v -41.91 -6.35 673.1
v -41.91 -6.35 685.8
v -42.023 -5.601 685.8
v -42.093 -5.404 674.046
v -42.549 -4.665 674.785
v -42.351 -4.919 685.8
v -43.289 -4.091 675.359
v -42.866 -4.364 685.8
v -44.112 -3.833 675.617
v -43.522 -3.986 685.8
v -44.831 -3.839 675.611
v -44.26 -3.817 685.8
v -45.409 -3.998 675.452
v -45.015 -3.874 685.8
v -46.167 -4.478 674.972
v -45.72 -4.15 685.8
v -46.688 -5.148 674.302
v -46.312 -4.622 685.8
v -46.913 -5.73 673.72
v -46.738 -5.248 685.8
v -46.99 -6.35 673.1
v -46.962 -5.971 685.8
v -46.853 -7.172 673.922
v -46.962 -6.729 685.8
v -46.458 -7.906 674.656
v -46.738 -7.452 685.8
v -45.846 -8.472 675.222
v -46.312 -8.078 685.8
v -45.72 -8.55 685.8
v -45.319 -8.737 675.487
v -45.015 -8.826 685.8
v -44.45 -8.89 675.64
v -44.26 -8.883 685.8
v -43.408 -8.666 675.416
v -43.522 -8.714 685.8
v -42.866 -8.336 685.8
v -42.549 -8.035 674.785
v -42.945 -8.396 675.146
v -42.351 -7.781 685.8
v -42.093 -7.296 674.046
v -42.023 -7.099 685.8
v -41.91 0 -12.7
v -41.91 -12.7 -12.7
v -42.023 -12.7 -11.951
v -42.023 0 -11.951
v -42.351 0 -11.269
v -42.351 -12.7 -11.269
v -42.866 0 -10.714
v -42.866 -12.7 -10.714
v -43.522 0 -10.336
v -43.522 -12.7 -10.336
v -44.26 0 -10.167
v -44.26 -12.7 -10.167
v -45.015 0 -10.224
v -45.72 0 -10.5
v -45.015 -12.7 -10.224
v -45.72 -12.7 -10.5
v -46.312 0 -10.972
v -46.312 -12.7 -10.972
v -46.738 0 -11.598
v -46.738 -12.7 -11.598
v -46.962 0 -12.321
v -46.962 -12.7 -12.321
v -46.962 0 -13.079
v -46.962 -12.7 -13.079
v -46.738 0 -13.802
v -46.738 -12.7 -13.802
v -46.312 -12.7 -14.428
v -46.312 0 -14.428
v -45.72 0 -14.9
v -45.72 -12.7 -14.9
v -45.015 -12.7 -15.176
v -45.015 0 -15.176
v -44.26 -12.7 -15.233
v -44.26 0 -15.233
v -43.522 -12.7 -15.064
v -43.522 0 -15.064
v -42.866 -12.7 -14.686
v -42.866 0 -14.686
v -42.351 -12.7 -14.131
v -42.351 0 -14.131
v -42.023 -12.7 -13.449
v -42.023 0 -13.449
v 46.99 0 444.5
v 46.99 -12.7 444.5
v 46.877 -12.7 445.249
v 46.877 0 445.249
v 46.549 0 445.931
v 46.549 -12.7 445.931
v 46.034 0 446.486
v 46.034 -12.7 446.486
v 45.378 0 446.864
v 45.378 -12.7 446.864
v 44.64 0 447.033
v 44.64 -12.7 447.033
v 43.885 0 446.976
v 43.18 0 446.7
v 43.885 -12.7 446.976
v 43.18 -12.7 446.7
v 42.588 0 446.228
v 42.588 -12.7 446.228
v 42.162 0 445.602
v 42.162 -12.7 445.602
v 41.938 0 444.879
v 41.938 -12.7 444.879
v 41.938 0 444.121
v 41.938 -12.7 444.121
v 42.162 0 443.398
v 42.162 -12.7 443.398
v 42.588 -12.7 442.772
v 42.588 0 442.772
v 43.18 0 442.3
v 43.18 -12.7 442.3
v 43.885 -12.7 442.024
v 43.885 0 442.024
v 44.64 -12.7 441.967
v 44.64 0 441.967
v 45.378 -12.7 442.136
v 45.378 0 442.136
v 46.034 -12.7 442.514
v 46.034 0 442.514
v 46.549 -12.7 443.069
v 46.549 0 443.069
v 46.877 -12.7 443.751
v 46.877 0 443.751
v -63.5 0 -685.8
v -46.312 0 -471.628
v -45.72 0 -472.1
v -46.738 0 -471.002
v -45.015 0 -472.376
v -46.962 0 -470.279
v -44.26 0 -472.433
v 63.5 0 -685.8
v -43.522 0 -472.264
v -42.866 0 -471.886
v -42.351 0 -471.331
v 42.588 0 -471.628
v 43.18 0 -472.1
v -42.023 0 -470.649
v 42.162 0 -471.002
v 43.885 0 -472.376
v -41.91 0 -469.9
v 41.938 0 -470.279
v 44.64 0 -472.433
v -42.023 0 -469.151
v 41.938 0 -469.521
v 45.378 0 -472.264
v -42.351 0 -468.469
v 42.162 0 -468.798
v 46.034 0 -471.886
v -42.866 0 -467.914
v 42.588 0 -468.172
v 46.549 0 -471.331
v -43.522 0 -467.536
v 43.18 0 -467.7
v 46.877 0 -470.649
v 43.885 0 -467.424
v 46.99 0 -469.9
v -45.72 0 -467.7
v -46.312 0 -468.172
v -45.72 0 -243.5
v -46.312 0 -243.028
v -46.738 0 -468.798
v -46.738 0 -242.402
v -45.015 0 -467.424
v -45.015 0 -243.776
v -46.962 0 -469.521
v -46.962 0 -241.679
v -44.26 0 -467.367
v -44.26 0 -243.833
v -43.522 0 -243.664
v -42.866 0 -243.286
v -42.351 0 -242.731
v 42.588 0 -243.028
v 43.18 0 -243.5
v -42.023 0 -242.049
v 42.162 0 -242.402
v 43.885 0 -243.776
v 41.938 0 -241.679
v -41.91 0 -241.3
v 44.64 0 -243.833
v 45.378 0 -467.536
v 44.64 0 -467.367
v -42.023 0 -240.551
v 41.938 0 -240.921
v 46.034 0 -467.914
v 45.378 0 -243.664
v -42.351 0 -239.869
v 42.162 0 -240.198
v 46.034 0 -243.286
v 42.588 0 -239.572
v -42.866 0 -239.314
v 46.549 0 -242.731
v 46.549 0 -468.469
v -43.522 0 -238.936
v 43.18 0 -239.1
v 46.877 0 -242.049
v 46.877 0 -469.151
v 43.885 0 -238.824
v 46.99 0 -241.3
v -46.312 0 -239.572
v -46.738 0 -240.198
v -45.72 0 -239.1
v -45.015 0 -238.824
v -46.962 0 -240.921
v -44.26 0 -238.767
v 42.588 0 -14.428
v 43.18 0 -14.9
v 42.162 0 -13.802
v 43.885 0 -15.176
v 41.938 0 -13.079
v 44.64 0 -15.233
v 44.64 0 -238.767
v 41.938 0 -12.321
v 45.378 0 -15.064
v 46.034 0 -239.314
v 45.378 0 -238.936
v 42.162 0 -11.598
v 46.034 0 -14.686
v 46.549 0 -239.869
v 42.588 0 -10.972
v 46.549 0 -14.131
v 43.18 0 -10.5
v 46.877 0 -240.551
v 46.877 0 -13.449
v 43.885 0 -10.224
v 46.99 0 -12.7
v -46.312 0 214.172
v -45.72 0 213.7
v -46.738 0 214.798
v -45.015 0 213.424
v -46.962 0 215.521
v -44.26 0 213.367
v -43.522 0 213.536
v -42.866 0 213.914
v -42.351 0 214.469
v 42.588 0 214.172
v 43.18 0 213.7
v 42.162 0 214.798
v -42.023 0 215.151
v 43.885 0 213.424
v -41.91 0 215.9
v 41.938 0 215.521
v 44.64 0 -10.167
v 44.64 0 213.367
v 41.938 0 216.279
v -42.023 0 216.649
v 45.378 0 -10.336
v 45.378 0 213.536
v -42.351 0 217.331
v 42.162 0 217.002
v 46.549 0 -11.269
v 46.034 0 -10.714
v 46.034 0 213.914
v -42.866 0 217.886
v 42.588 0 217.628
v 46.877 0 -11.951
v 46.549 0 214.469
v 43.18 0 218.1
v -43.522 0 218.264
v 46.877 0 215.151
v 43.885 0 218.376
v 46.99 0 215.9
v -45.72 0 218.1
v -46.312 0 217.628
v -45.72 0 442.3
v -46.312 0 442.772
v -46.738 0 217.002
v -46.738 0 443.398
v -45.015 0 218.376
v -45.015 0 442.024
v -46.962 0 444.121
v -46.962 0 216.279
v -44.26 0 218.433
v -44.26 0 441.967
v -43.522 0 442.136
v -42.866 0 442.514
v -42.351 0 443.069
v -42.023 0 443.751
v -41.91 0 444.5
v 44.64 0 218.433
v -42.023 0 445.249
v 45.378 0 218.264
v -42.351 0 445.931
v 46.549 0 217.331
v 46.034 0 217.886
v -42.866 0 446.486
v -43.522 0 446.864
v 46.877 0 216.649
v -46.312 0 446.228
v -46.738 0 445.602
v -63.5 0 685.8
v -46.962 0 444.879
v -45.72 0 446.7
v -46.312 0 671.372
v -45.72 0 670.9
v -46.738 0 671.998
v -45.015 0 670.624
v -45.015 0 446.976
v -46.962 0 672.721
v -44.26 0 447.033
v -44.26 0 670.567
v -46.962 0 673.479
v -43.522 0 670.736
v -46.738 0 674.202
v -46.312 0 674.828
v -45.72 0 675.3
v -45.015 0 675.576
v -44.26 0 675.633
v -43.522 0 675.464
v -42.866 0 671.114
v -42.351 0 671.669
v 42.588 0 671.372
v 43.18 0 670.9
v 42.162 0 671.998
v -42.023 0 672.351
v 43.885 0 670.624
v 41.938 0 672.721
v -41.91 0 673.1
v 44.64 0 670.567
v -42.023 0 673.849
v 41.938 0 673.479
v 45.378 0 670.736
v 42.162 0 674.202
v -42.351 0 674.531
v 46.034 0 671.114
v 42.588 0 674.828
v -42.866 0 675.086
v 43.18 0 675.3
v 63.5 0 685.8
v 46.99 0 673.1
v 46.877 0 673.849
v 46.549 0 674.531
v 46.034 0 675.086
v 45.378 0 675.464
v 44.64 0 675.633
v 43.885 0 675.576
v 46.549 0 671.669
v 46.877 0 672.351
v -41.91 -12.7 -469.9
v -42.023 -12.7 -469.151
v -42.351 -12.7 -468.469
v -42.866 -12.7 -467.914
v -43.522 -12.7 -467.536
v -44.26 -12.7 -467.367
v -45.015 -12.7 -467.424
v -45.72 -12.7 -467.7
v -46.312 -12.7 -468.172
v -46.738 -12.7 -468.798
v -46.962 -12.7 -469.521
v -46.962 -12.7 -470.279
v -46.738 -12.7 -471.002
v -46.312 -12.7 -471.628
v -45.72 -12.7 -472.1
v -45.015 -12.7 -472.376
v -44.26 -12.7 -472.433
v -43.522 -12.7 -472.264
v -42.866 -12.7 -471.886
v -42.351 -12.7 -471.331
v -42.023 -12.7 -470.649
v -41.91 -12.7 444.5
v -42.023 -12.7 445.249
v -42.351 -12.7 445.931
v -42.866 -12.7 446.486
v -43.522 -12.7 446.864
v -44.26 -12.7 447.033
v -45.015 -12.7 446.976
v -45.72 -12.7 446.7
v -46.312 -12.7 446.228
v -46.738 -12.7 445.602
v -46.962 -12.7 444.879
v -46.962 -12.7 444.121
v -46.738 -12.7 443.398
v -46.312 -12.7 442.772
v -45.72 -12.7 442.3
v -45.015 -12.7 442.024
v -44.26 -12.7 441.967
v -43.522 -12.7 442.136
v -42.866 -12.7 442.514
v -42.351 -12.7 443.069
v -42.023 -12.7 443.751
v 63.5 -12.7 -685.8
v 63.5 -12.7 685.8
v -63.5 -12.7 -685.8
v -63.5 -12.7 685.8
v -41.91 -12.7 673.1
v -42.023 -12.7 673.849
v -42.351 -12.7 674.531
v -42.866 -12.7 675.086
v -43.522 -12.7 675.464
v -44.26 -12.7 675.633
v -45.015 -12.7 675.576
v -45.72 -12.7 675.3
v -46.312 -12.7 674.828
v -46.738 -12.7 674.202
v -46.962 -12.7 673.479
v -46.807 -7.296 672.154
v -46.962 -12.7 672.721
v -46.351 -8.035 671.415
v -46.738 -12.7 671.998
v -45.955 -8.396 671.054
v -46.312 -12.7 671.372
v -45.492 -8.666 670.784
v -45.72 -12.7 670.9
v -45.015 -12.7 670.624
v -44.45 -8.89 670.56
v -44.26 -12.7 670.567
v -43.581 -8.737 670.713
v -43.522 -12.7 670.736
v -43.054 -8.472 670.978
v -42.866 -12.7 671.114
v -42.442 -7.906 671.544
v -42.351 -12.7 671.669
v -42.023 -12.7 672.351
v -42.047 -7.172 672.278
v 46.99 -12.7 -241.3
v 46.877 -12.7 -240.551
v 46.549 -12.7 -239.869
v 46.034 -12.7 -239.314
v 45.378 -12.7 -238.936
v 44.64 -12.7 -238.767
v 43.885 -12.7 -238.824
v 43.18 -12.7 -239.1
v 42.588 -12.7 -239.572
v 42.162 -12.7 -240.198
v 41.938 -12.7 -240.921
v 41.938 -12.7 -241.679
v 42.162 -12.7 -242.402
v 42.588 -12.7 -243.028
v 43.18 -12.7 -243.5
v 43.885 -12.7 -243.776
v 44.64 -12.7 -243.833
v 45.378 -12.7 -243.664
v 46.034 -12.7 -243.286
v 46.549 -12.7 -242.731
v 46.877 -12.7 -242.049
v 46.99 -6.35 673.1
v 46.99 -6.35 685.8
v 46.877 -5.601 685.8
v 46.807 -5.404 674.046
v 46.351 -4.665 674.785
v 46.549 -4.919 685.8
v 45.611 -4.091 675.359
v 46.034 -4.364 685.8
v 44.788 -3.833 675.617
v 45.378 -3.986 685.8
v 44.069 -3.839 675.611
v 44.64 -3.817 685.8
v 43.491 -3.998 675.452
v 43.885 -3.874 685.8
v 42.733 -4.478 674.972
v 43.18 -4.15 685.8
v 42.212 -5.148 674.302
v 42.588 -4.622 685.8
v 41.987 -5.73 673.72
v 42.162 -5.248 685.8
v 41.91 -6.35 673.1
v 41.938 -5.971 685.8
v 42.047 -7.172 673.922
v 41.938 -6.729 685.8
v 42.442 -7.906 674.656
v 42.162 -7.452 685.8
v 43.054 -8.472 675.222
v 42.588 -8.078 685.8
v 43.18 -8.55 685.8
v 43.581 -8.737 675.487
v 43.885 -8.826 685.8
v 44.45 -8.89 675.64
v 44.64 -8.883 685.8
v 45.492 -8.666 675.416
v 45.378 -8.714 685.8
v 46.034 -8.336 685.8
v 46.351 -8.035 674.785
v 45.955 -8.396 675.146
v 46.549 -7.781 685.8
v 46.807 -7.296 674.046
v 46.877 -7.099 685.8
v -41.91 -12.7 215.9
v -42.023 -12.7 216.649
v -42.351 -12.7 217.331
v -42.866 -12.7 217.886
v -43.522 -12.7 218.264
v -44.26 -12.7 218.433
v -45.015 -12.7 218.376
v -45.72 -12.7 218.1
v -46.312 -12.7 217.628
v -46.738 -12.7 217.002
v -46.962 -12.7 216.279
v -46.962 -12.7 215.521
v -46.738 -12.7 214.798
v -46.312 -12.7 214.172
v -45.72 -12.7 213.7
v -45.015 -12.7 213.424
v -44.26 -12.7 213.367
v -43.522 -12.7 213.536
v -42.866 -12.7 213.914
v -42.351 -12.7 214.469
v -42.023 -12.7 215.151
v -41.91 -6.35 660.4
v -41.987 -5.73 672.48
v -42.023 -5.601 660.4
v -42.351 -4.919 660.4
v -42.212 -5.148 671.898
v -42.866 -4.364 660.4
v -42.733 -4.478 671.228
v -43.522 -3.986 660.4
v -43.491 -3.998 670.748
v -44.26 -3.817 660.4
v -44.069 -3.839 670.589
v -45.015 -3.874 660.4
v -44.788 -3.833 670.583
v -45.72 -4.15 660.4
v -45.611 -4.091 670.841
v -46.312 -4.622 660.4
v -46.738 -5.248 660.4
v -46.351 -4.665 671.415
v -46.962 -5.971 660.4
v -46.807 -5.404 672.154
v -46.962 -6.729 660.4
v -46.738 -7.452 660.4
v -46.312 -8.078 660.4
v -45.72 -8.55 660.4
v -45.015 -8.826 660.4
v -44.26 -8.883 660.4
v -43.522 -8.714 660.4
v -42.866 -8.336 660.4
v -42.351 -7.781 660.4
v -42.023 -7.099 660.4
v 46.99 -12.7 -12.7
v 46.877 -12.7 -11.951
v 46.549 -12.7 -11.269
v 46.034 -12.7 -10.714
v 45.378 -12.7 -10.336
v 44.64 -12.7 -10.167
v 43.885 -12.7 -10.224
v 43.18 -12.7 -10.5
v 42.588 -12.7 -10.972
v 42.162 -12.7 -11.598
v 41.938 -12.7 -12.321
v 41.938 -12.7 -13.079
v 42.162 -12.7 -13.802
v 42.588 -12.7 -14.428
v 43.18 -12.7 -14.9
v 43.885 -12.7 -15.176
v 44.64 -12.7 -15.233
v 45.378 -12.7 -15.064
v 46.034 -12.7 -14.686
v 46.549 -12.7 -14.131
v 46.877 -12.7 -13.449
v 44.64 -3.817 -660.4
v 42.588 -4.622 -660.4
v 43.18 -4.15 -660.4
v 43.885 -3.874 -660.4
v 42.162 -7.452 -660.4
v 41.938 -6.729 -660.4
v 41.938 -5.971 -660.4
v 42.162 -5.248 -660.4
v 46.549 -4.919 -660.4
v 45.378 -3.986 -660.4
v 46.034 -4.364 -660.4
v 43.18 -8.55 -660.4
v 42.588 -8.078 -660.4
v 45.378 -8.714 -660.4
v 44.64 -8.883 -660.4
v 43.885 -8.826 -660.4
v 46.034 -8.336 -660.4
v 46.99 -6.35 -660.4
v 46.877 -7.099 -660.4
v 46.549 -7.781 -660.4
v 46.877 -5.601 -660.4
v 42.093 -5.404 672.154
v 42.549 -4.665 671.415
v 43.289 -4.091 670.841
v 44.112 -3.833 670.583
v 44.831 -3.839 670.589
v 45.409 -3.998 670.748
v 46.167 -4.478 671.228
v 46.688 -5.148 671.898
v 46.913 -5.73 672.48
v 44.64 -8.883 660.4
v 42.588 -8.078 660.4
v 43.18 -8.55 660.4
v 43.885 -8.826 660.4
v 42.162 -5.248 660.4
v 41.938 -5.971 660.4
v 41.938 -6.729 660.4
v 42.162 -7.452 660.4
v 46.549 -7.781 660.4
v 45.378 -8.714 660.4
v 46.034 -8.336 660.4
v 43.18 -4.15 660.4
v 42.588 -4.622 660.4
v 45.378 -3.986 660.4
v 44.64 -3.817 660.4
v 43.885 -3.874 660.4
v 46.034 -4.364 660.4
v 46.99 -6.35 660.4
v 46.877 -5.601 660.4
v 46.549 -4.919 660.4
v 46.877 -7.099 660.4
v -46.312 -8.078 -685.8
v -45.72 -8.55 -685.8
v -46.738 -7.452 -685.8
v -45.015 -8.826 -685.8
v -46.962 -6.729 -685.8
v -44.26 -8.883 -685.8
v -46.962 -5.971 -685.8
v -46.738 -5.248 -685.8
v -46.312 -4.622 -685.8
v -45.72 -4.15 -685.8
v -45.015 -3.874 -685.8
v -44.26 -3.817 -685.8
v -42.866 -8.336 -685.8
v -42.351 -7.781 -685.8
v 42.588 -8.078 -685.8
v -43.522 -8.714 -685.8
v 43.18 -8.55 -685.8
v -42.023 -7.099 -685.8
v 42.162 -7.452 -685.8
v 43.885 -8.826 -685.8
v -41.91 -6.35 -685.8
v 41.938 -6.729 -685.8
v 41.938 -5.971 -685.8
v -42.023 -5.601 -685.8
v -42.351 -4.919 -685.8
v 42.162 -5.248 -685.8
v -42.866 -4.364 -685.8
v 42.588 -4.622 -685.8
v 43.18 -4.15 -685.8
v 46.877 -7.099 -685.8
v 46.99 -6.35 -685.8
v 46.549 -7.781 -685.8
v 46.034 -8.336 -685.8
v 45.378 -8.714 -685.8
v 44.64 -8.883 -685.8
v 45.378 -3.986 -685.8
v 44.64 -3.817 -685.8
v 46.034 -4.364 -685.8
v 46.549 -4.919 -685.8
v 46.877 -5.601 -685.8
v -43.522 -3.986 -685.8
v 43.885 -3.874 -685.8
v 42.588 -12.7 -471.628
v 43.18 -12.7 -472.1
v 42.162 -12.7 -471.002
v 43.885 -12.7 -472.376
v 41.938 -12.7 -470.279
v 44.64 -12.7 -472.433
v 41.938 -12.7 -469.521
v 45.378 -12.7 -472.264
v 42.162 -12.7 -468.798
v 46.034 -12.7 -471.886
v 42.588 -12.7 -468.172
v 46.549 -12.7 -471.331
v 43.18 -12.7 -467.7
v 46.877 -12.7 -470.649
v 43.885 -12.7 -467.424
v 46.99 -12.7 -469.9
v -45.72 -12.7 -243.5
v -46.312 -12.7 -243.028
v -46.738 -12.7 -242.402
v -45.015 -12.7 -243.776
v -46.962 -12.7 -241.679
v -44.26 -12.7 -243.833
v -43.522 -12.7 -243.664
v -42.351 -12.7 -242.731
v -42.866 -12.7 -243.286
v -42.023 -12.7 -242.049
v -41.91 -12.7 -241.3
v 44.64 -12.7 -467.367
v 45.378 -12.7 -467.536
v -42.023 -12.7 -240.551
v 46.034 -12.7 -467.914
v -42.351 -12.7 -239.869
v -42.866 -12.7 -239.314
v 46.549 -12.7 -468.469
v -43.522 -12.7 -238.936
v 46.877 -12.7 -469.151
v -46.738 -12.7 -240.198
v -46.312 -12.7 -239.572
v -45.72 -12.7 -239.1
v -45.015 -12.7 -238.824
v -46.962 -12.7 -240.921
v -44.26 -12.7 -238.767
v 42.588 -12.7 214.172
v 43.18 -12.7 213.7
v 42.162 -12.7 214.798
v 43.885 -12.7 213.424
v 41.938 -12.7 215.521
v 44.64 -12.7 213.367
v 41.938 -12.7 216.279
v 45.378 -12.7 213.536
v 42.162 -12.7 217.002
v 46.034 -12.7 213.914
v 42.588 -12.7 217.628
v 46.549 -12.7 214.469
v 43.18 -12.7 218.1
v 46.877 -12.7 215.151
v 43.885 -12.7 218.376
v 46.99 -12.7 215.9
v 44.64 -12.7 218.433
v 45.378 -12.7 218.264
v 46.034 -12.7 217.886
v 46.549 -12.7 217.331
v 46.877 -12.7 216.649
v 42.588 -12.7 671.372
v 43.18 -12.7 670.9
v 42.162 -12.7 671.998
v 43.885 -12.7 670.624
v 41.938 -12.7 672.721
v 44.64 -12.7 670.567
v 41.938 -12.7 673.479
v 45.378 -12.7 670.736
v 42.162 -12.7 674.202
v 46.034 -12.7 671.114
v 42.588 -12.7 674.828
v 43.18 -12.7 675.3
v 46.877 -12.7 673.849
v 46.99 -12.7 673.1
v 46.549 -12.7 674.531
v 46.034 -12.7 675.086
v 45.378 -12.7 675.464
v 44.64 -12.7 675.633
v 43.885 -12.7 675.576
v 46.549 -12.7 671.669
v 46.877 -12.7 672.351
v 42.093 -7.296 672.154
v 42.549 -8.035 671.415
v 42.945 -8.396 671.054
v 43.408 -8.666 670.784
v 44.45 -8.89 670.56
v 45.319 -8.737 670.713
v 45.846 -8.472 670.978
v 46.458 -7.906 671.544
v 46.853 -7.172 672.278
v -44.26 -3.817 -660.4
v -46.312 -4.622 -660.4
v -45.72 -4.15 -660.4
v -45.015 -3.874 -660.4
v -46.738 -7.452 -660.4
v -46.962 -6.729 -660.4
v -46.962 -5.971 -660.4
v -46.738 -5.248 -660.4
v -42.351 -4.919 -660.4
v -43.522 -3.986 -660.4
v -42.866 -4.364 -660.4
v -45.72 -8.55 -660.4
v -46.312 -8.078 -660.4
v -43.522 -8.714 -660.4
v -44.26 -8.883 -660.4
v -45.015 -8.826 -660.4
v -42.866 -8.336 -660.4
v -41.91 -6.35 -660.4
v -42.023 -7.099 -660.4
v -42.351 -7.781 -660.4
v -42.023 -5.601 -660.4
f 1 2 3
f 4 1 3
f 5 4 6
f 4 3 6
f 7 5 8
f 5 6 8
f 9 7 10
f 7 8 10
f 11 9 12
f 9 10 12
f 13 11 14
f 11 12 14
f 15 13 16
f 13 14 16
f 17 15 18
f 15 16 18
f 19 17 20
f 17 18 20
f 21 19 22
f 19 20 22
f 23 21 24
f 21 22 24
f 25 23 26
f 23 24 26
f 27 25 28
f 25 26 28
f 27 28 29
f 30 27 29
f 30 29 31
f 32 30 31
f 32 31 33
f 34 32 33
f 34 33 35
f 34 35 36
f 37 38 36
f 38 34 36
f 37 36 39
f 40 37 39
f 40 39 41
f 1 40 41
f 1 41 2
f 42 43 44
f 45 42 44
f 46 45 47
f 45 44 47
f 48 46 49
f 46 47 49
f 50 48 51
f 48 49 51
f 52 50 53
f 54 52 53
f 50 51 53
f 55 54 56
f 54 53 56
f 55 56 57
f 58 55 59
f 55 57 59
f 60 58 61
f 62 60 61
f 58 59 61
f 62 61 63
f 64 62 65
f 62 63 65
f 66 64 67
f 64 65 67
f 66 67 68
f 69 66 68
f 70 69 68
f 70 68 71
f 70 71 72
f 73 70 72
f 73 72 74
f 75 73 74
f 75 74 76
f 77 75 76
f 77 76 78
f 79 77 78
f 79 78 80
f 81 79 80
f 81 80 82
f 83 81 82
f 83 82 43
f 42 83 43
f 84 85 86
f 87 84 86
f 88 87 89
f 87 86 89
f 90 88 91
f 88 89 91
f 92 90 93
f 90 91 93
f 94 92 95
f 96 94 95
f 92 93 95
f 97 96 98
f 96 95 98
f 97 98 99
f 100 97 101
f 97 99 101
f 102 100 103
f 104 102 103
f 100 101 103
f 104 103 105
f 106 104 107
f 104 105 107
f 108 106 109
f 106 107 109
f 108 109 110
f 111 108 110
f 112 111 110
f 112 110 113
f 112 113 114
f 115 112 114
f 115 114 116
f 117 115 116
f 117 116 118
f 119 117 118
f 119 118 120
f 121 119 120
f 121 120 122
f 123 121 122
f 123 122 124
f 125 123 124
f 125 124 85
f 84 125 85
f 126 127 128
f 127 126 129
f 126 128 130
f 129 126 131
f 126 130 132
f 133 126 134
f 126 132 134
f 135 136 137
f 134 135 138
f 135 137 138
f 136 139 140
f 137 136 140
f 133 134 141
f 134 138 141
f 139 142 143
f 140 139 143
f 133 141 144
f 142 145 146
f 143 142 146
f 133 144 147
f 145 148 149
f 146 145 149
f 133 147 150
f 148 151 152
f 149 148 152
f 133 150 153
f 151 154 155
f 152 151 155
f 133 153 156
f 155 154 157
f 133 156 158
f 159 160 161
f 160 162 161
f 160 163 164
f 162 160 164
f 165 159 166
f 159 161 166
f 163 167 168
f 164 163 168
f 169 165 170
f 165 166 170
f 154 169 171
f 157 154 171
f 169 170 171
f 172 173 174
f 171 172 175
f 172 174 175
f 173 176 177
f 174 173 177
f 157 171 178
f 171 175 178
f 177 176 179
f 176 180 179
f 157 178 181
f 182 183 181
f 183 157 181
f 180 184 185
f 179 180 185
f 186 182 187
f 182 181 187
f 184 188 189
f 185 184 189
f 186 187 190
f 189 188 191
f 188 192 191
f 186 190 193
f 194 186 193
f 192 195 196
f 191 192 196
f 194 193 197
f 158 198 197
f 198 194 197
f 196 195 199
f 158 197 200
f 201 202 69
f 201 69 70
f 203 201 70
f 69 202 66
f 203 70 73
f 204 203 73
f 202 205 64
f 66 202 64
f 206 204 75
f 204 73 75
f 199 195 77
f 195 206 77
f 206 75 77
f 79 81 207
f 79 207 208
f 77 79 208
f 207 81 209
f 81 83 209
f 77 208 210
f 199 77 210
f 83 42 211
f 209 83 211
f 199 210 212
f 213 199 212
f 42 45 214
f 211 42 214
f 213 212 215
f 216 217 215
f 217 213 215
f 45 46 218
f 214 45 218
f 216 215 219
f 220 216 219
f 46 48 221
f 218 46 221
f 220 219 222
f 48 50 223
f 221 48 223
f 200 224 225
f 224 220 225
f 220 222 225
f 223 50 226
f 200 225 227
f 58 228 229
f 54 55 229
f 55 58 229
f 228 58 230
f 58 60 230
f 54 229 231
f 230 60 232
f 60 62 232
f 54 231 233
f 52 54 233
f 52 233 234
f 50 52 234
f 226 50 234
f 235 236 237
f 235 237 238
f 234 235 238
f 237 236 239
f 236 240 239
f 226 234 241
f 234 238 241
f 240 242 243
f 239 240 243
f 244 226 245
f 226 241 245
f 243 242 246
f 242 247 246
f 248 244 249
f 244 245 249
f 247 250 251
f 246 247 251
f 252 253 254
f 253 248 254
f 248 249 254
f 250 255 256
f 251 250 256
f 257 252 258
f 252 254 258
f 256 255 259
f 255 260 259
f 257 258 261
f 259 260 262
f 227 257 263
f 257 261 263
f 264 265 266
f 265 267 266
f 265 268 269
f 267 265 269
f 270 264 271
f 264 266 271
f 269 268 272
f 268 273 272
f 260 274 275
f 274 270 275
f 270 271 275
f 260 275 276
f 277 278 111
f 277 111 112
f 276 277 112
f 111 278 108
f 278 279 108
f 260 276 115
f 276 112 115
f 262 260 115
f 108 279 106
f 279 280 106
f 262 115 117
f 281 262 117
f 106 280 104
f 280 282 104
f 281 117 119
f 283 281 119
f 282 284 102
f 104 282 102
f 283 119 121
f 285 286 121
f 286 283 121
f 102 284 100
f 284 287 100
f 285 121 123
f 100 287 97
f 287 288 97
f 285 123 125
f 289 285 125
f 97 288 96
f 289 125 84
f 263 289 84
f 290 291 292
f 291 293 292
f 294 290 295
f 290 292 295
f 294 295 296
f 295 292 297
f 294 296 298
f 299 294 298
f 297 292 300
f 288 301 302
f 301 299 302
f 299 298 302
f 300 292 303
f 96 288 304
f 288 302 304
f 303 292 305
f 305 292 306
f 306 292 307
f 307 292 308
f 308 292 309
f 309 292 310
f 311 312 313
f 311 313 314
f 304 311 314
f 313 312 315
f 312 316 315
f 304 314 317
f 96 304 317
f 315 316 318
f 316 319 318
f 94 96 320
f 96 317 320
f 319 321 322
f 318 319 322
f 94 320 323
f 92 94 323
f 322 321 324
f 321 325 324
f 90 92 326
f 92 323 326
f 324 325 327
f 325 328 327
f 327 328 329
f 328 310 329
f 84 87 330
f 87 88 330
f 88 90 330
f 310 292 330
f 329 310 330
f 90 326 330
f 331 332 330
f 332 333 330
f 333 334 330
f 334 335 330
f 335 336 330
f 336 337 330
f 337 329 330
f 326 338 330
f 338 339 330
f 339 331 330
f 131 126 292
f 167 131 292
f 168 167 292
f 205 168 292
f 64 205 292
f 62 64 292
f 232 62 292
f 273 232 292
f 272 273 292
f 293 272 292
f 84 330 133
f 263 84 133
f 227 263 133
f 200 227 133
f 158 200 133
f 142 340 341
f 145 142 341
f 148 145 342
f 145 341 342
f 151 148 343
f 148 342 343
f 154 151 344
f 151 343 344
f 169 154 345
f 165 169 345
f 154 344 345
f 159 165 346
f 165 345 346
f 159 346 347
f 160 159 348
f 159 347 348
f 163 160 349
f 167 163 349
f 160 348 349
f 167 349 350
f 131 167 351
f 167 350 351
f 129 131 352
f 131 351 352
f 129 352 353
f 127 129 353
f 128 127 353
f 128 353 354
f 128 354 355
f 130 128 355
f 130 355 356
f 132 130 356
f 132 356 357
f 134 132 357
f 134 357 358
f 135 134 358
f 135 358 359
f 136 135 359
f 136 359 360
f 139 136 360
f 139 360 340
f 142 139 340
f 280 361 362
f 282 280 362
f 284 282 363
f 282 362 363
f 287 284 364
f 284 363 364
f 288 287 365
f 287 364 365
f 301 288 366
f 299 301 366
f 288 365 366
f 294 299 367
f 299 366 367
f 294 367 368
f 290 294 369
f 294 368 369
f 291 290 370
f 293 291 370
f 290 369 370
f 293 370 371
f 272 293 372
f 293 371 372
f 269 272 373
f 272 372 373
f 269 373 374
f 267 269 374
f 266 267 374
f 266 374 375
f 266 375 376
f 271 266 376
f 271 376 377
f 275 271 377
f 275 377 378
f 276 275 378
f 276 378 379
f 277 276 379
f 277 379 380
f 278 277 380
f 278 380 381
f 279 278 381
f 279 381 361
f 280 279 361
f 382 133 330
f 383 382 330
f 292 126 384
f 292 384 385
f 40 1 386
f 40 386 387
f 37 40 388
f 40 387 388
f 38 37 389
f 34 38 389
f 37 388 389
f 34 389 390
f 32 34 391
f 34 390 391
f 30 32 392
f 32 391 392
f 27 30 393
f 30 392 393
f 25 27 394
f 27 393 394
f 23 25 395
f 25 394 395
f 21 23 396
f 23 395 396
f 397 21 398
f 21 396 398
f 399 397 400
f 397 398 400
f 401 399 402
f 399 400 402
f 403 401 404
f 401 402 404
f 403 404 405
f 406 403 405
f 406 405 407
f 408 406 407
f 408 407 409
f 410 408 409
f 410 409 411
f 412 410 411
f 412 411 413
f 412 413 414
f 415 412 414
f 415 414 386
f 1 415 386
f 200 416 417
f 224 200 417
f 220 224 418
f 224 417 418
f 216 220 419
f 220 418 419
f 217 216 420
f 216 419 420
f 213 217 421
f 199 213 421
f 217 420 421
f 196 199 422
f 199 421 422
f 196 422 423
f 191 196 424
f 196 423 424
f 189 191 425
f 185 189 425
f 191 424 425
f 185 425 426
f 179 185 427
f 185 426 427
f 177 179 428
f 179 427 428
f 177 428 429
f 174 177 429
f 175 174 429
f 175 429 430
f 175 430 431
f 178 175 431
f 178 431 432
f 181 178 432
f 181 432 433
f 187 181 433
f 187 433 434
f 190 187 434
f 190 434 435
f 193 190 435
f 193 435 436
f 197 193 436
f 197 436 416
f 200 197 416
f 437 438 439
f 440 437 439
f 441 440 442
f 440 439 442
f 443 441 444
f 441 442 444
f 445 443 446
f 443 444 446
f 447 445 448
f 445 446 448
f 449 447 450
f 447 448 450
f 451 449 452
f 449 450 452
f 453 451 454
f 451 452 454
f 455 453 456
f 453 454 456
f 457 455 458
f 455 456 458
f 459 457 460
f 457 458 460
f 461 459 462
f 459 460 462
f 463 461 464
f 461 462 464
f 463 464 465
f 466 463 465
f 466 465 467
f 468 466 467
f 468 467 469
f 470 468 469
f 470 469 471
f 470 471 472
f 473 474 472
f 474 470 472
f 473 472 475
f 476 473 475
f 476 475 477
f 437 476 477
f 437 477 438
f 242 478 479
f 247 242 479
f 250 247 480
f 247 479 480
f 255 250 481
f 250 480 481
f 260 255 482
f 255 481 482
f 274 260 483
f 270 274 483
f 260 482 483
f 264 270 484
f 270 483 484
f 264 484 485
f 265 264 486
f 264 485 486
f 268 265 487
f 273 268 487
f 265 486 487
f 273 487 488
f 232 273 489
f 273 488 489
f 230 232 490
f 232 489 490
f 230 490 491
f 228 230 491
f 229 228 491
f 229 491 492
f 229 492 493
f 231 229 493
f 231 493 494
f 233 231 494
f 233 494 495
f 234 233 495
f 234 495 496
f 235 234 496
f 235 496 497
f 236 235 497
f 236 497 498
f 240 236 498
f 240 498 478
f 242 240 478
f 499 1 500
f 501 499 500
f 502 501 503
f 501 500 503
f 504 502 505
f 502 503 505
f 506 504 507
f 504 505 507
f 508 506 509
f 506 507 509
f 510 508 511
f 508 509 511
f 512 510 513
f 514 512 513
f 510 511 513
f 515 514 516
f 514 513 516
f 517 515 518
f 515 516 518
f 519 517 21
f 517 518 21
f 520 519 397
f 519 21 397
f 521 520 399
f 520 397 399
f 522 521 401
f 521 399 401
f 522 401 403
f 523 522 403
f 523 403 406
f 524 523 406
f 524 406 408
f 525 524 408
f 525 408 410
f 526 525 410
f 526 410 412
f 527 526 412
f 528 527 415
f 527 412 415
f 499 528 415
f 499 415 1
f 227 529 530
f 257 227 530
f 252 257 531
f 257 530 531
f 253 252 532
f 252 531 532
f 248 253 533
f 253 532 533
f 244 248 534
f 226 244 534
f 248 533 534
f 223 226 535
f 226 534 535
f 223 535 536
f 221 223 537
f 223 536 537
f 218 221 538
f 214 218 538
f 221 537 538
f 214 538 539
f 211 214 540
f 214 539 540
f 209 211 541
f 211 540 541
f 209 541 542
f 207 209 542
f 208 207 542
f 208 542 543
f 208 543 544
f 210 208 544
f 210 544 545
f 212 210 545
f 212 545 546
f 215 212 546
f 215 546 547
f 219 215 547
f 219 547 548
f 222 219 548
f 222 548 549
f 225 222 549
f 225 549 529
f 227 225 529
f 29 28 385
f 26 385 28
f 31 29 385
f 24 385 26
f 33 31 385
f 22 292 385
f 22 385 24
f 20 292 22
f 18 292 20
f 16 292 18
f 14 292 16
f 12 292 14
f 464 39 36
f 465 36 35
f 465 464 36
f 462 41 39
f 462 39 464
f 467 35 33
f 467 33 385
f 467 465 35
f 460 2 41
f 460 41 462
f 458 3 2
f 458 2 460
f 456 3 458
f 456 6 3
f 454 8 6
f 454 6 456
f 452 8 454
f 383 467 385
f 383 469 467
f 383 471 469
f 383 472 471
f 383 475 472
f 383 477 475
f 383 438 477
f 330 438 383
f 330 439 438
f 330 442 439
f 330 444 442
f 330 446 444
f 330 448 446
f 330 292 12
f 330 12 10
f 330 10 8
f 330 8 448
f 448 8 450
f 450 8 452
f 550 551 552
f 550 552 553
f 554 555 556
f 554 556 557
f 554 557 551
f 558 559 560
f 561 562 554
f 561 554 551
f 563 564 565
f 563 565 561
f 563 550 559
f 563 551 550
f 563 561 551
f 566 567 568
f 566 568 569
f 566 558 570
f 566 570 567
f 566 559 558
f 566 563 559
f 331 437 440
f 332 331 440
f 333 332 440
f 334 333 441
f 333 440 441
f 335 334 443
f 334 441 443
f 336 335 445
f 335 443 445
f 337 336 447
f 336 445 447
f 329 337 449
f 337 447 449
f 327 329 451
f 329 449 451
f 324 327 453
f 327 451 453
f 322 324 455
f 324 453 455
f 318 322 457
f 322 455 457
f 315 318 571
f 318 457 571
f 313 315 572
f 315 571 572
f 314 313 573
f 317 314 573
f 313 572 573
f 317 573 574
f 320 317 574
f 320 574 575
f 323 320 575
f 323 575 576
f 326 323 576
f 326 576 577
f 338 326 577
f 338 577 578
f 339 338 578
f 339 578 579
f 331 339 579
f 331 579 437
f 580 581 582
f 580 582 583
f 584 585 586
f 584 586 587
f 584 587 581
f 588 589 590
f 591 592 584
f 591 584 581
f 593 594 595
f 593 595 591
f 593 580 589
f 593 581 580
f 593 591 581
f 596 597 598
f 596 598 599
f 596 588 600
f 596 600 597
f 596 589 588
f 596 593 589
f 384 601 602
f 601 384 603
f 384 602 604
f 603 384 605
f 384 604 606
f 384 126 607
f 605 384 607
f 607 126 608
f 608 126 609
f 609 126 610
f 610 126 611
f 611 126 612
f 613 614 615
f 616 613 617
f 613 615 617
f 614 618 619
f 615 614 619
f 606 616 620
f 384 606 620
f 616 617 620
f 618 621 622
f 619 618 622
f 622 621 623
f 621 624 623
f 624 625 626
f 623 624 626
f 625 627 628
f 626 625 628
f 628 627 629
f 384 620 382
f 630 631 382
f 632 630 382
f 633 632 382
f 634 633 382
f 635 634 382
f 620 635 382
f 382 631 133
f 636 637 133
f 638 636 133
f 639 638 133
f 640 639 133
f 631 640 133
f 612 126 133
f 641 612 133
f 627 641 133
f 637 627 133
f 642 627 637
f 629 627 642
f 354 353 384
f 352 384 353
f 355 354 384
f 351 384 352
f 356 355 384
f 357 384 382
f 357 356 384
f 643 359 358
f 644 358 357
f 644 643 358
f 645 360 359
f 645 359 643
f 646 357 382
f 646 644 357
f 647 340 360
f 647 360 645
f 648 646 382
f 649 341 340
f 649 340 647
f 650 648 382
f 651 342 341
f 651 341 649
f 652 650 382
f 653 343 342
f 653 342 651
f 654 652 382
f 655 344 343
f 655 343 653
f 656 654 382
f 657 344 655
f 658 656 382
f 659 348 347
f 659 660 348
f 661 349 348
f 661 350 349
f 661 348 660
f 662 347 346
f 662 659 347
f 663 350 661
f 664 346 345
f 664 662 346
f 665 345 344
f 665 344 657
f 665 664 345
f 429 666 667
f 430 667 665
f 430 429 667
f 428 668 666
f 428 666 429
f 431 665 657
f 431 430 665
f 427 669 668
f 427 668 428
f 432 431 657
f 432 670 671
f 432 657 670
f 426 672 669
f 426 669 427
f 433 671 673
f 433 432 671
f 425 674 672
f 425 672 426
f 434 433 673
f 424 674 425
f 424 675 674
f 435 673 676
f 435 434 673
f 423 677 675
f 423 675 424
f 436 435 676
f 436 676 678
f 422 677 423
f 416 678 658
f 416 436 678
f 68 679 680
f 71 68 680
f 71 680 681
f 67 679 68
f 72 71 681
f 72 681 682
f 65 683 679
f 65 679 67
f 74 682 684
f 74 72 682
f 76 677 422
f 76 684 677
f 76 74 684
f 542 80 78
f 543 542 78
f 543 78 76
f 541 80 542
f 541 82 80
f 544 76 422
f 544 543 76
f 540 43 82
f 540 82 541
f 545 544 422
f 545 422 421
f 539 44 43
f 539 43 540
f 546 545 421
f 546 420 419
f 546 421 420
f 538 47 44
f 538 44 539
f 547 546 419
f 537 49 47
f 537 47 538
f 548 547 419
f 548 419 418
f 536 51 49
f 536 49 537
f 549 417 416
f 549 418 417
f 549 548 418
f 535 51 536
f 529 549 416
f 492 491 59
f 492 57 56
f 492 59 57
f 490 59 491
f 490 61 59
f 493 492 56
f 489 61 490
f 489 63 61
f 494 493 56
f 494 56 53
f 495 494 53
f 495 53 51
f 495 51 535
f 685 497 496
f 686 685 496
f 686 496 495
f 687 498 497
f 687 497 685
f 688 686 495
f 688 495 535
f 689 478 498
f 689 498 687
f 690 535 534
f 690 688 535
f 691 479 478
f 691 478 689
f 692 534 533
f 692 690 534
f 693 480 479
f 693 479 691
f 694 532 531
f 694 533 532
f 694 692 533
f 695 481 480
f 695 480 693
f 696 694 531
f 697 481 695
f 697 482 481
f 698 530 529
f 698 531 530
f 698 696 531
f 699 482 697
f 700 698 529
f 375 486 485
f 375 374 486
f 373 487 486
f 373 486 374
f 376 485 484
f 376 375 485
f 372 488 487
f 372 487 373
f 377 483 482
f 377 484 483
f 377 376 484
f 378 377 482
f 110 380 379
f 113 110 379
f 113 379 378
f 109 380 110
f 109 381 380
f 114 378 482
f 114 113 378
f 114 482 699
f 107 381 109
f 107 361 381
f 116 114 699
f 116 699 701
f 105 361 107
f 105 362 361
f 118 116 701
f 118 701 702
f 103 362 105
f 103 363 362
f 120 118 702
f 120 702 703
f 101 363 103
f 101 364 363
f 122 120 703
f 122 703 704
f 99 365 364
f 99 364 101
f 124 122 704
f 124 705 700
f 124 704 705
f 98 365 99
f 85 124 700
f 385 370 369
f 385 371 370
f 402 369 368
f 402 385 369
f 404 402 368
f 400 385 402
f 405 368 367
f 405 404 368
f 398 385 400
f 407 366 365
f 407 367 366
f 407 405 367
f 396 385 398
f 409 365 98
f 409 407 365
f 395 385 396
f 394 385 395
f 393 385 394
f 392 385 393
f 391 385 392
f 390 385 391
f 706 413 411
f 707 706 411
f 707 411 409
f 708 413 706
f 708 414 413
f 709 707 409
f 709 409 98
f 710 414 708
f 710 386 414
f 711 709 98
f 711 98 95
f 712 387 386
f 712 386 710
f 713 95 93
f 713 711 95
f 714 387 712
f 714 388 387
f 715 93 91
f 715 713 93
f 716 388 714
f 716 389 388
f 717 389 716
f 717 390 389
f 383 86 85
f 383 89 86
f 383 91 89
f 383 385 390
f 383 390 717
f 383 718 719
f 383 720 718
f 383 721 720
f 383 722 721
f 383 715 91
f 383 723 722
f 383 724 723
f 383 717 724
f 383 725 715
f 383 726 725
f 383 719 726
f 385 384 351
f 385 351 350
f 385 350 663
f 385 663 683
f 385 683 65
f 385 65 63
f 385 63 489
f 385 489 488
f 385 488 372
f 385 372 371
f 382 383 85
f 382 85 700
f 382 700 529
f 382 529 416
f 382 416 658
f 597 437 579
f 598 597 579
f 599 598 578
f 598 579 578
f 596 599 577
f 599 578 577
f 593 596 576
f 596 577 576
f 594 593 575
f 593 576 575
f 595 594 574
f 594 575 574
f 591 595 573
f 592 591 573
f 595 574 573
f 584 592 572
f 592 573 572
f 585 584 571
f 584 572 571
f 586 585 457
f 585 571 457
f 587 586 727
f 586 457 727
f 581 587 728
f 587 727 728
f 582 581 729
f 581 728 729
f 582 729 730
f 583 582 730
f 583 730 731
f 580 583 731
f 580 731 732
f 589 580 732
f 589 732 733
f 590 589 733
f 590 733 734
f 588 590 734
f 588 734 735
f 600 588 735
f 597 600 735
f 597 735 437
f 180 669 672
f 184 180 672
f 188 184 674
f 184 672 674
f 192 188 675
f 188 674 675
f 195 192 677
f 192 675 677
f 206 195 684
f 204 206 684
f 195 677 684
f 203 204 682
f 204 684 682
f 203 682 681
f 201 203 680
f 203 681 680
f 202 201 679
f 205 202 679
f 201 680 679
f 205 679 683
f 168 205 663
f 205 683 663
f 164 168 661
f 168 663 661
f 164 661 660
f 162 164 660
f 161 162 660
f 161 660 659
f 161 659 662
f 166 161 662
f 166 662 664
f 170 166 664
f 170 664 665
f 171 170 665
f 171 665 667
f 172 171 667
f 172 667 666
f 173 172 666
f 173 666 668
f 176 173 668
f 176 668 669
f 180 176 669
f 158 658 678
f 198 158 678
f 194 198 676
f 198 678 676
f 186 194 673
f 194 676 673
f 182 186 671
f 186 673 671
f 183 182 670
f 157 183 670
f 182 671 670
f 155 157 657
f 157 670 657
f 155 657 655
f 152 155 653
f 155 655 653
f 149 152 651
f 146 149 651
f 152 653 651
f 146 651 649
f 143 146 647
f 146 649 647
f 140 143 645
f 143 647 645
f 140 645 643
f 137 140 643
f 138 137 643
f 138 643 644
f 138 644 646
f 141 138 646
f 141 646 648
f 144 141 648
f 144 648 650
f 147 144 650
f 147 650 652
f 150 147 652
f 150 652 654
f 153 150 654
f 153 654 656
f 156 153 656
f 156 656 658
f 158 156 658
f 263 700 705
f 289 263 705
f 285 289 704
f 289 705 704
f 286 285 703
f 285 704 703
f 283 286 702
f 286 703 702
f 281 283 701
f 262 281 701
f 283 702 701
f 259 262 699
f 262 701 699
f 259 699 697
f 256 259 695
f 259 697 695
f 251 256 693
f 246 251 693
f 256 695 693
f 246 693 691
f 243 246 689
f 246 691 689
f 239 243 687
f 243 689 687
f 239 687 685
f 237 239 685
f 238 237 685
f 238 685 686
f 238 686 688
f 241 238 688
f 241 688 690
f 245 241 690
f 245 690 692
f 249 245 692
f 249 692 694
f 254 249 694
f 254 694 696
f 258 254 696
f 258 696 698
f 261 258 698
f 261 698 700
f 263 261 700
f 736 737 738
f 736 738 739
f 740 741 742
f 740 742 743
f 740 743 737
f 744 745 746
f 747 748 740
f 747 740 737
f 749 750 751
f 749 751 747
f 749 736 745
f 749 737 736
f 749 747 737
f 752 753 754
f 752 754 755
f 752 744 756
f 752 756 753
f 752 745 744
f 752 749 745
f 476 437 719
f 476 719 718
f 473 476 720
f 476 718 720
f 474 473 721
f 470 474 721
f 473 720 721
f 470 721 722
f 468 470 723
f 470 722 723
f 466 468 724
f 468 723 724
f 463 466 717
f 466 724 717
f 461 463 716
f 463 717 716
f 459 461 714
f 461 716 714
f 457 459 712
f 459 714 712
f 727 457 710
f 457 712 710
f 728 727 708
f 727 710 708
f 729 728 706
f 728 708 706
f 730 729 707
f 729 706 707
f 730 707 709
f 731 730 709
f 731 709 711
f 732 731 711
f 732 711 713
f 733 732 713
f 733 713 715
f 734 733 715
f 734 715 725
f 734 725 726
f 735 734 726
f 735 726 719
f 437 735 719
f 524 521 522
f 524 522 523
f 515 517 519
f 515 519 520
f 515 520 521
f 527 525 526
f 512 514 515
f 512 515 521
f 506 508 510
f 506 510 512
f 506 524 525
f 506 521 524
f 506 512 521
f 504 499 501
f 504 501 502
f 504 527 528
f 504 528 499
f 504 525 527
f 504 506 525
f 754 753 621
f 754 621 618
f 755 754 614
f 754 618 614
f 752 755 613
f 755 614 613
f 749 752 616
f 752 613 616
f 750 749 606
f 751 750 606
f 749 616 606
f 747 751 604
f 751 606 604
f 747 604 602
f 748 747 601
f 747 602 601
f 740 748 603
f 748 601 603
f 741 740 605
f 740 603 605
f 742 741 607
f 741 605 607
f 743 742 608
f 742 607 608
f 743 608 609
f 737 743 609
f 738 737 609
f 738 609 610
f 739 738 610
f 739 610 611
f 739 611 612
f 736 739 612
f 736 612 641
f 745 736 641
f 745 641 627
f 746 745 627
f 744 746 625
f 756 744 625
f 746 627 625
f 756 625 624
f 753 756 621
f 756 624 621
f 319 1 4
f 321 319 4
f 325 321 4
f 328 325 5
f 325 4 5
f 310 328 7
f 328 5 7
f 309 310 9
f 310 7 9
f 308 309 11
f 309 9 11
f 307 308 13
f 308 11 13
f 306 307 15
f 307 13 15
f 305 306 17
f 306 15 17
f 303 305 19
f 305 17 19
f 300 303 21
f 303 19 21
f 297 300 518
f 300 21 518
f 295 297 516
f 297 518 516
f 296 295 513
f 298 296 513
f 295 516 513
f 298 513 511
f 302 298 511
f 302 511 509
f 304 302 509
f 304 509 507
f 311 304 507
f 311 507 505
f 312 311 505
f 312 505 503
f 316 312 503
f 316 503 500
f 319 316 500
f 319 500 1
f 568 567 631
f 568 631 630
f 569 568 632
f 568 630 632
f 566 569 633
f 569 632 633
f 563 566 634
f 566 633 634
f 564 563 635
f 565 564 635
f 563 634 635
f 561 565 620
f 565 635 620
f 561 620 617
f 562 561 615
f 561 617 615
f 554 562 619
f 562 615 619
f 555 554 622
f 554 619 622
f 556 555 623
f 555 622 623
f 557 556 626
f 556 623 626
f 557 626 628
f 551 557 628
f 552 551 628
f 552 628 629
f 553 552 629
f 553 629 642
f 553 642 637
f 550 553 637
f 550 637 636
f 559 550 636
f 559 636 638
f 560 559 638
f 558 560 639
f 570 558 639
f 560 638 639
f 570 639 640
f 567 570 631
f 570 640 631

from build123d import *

# Parameters (mm, degrees)
F0_W     = 127
F0_H     = 1371.6
F1_DEPTH = 12.7
F2_R     = 2.54
F3_DEPTH = 309.88
F4_R     = 2.54
F5_DEPTH = 25.4
F6_R     = 2.54
F7_DEPTH = 25.4


with BuildPart() as f1:
    # F0 (on Front) → F1 (new body)
    with BuildSketch(Plane.XZ):
        Rectangle(F0_W, F0_H)
    extrude(amount=F1_DEPTH)

    # F2 (on face) → F3 (cut)
    with BuildSketch(Plane.XZ.offset(12.7)):
        with Locations((-44.45, -469.9)):
            Circle(F2_R)
        with Locations((44.45, -469.9)):
            Circle(F2_R)
        with Locations((44.45, -241.3)):
            Circle(F2_R)
        with Locations((-44.45, -241.3)):
            Circle(F2_R)
        with Locations((44.45, -12.7)):
            Circle(F2_R)
        with Locations((-44.45, -12.7)):
            Circle(F2_R)
        with Locations((44.45, 215.9)):
            Circle(F2_R)
        with Locations((-44.45, 215.9)):
            Circle(F2_R)
        with Locations((44.45, 444.5)):
            Circle(F2_R)
        with Locations((-44.45, 444.5)):
            Circle(F2_R)
        with Locations((44.45, 673.1)):
            Circle(F2_R)
        with Locations((-44.45, 673.1)):
            Circle(F2_R)
    extrude(amount=-F3_DEPTH, mode=Mode.SUBTRACT)

    # F4 (on face) → F5 (cut)
    with BuildSketch(Plane(origin=(0, 0, -685.8), x_dir=(1, 0, 0), z_dir=(0, 0, -1))):
        with Locations((-44.45, 6.35)):
            Circle(F4_R)
        with Locations((44.45, 6.35)):
            Circle(F4_R)
    extrude(amount=-F5_DEPTH, mode=Mode.SUBTRACT)

    # F6 (on face) → F7 (cut)
    with BuildSketch(Plane.XY.offset(685.8)):
        with Locations((-44.45, -6.35)):
            Circle(F6_R)
        with Locations((44.45, -6.35)):
            Circle(F6_R)
    extrude(amount=-F7_DEPTH, mode=Mode.SUBTRACT)


solid = f1.part
